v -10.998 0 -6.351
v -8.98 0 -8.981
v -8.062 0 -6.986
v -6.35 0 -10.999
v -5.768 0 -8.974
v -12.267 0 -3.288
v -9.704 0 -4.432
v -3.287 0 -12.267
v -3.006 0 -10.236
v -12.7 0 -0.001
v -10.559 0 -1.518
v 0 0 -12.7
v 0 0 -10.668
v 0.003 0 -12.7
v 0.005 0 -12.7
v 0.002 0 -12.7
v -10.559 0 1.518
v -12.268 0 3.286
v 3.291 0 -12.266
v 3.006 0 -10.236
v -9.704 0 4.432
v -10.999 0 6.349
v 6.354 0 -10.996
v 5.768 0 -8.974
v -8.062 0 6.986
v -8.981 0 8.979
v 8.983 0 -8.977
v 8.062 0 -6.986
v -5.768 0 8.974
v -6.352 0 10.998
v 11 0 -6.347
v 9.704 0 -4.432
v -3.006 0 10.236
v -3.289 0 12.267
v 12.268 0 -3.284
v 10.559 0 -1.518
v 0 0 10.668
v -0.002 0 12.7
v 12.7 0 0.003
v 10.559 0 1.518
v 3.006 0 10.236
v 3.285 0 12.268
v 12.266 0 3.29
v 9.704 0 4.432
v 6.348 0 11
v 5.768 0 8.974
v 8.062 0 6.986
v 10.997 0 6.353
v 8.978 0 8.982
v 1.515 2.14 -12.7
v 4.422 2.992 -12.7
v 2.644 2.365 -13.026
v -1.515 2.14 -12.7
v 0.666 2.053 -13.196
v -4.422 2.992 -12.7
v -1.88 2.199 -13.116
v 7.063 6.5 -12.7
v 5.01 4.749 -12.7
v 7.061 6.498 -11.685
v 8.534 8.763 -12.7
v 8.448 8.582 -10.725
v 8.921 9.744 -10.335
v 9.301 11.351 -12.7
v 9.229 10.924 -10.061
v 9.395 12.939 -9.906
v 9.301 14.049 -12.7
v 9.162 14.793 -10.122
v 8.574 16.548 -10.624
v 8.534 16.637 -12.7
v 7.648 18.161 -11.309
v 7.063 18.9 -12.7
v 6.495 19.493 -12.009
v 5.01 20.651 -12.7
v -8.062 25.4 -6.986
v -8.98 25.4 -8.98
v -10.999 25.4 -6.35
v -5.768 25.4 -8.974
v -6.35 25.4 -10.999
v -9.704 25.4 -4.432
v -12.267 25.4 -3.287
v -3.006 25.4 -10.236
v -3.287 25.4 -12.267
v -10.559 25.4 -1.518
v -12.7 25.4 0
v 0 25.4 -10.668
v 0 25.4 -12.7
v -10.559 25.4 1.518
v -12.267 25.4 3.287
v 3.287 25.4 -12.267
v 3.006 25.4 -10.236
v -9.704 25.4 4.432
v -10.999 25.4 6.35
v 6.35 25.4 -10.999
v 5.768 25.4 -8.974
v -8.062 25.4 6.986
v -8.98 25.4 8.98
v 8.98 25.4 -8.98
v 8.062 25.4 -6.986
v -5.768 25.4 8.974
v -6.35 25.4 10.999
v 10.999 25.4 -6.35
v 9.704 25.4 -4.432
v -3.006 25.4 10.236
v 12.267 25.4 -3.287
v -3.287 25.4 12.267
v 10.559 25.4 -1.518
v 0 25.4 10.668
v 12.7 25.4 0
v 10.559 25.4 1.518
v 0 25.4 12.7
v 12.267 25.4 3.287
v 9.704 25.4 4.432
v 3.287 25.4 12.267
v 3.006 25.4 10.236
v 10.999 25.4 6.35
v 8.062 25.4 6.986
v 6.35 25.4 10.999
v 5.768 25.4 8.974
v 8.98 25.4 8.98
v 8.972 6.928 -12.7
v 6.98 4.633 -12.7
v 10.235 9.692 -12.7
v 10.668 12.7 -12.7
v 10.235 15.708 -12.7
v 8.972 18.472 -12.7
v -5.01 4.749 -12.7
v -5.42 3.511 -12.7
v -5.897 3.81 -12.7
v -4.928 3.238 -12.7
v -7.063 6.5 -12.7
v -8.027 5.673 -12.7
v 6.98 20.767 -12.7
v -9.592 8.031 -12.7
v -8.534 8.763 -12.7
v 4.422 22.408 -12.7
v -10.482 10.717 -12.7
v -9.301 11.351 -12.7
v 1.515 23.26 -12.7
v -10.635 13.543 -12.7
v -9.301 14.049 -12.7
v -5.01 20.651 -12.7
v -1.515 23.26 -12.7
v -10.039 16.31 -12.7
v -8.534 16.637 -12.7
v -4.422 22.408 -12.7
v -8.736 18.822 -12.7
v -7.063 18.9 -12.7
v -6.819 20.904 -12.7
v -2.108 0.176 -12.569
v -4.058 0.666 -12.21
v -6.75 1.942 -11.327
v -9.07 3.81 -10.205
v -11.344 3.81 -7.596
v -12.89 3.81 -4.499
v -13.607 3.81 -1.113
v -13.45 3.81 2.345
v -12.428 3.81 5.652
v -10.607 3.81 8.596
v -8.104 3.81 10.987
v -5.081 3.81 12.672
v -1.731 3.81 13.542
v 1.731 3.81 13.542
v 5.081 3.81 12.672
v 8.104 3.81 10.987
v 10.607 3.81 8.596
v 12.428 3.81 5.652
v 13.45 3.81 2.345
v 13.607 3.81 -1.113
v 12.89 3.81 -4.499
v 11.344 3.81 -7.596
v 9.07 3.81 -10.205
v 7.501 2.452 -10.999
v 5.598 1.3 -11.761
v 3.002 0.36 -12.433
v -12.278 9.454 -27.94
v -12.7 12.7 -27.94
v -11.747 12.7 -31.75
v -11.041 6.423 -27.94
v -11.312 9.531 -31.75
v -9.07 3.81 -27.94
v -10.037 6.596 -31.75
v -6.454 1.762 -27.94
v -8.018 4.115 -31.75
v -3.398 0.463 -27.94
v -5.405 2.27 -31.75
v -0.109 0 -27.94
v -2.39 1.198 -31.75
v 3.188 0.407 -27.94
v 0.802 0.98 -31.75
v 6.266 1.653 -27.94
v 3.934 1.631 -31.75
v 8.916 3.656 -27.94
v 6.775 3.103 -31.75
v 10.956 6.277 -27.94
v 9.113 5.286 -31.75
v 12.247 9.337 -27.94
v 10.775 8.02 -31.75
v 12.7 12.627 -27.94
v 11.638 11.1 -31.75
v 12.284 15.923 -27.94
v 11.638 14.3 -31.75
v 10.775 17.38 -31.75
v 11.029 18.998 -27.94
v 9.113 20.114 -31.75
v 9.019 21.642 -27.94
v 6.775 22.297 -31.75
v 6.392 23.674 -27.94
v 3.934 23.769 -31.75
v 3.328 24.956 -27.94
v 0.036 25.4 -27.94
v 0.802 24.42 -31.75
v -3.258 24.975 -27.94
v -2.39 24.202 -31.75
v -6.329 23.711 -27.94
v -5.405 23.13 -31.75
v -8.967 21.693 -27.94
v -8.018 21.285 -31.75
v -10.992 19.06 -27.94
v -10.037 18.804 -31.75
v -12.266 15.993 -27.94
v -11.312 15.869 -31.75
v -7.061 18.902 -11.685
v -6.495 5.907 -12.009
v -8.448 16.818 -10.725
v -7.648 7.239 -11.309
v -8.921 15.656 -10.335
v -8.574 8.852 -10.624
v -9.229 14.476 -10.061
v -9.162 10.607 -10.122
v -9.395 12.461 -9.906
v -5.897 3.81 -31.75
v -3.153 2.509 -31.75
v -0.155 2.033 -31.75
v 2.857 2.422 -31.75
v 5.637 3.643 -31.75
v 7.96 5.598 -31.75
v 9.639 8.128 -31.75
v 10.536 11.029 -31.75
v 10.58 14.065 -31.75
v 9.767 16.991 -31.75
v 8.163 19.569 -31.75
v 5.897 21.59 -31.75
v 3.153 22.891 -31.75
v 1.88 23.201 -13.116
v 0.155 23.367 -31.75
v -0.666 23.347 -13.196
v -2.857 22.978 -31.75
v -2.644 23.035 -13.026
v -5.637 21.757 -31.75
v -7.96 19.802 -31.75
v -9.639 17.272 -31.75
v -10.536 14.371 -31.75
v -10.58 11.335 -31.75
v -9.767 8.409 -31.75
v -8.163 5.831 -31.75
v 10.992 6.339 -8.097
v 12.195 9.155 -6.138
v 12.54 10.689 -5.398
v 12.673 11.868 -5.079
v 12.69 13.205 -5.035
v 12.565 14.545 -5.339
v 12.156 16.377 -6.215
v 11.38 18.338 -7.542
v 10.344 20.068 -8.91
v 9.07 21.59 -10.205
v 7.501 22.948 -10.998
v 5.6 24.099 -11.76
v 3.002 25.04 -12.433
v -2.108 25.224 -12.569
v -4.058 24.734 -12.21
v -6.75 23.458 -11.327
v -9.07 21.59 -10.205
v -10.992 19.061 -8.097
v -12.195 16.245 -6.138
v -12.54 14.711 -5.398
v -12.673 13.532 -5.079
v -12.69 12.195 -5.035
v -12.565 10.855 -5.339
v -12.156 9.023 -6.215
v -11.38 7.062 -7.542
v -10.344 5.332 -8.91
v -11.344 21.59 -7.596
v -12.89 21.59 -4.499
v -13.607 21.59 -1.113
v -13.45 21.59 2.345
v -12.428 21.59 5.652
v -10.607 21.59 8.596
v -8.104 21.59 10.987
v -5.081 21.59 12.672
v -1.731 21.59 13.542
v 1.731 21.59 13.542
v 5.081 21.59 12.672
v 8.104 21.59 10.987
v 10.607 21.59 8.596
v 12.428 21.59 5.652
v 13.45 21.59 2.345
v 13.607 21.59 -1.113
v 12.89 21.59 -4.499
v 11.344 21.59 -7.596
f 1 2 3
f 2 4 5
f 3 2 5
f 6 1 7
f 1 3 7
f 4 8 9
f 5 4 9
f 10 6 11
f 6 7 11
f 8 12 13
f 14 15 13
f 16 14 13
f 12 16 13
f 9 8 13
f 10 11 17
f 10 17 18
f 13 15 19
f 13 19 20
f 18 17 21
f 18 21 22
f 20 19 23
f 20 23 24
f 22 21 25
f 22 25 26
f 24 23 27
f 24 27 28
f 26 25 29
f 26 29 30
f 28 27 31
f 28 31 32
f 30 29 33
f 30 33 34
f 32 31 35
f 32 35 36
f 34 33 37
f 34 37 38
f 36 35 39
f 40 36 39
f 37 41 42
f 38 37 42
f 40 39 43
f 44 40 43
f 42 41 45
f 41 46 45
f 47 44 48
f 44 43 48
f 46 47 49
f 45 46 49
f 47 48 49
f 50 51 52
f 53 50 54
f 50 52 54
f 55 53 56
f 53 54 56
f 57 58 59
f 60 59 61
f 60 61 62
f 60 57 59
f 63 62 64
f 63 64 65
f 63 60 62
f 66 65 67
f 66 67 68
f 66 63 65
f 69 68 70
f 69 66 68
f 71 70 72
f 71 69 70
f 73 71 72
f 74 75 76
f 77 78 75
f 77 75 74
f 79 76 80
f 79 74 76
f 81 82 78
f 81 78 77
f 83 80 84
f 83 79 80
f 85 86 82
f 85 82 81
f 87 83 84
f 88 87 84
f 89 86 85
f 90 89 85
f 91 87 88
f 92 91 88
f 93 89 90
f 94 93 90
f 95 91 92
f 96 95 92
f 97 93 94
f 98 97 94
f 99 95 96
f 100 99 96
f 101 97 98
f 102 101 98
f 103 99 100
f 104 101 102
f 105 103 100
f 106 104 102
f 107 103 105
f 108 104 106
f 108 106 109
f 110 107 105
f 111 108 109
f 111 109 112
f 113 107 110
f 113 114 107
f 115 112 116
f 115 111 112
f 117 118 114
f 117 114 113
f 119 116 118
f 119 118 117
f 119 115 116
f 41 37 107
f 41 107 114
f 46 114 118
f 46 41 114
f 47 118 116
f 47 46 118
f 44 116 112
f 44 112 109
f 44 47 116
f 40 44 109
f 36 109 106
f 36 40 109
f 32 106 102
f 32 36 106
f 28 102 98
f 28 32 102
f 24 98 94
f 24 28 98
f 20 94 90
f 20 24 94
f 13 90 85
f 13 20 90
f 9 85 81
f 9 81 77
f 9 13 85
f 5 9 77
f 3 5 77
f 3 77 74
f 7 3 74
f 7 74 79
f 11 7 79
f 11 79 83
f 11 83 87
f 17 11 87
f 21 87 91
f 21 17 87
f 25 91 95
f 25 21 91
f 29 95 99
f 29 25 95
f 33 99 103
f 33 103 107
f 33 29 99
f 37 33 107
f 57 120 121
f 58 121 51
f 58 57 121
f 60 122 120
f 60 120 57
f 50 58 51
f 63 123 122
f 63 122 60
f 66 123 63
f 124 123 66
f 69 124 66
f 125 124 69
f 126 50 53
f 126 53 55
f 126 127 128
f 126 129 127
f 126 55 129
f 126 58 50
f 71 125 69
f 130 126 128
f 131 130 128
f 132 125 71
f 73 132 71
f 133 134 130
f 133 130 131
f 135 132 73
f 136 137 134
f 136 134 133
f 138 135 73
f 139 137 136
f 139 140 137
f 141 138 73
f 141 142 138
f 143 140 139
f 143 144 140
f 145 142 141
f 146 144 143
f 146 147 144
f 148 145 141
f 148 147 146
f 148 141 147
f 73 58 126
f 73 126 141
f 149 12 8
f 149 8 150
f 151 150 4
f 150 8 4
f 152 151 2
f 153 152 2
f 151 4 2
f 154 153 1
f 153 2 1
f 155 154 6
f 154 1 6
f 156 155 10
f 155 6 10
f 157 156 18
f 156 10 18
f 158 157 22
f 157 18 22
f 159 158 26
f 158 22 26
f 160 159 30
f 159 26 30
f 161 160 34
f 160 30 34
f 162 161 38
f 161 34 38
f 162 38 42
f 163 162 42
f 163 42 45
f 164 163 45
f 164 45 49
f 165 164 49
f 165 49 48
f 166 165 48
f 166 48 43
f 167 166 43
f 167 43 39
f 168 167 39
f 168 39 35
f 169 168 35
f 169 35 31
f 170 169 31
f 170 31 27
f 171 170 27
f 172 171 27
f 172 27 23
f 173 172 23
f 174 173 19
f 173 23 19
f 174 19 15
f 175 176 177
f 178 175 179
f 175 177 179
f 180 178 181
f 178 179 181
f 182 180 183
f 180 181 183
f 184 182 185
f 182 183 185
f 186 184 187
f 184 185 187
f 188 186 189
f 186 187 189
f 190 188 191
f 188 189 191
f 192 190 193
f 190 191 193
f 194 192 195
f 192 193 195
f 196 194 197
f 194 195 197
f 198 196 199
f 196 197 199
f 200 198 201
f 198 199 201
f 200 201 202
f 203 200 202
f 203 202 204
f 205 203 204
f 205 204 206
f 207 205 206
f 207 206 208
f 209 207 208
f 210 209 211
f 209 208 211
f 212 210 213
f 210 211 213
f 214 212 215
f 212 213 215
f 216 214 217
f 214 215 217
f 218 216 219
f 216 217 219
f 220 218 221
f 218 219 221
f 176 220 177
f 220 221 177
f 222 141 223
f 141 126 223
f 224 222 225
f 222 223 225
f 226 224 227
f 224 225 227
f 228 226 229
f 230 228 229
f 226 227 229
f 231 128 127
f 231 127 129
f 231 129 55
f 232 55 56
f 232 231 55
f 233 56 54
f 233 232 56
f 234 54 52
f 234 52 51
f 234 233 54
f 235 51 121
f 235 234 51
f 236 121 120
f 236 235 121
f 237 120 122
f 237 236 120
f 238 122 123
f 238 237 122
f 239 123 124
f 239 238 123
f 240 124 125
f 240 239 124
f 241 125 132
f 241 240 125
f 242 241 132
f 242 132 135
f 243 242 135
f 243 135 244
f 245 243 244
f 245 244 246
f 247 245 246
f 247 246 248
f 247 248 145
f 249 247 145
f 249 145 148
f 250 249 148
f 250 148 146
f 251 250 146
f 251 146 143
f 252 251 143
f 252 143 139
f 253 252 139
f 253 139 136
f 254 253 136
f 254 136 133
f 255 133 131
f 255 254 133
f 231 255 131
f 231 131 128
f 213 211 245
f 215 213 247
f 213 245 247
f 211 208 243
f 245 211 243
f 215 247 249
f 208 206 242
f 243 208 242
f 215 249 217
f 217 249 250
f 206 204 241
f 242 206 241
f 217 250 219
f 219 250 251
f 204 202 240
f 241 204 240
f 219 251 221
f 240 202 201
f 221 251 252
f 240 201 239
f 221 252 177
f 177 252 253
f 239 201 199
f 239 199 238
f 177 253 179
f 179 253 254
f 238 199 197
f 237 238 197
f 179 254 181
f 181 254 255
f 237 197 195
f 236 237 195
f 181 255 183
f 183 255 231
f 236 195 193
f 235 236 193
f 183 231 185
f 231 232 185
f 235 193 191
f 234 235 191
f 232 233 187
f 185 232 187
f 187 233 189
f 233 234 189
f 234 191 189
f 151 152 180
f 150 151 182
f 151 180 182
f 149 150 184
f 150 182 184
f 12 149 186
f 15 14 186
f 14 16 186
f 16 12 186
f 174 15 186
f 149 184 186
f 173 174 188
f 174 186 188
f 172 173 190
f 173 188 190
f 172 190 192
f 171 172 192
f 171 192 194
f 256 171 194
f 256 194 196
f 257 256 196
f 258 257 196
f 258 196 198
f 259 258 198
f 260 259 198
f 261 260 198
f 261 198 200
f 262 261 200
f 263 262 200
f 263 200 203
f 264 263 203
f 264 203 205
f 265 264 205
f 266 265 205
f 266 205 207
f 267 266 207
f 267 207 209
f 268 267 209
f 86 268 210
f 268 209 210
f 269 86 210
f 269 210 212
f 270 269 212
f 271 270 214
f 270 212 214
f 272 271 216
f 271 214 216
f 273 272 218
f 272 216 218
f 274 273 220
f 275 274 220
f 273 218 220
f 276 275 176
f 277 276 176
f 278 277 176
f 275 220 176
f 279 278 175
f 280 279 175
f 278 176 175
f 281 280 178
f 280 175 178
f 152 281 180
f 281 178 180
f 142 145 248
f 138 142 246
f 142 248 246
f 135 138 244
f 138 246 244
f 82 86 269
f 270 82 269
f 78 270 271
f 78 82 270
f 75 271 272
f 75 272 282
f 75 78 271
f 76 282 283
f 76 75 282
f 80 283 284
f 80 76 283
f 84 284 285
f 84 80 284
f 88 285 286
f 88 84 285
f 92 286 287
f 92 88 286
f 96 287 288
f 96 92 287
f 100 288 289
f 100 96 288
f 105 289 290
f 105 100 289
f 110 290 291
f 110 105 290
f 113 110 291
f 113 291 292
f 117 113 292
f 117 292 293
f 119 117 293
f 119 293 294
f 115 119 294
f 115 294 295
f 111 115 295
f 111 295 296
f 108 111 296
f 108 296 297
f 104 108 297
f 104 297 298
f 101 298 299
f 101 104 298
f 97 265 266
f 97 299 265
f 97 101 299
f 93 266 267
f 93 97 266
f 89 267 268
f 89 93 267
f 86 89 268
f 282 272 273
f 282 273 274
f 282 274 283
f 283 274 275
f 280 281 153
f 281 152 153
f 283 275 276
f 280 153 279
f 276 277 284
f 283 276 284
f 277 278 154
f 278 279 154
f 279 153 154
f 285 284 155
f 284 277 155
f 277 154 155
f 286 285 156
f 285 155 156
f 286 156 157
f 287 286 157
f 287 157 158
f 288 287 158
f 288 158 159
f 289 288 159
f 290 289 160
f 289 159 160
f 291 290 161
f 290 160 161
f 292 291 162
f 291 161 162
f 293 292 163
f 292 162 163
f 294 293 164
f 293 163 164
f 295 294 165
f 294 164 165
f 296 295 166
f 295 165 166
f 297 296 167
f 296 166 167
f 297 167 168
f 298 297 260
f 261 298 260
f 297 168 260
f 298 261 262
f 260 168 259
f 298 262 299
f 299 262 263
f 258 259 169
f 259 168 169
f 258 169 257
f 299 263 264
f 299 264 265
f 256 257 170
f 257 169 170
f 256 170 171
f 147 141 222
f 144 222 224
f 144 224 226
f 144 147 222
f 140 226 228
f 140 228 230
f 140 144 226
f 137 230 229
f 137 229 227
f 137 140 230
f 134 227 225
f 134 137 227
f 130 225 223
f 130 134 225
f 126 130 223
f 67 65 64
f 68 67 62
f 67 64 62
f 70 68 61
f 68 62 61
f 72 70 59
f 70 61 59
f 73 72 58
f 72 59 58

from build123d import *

# Parameters (mm, degrees)
SKETCH1_R           = 13.6525
SKETCH1_R_2         = 10.668
BOSS_EXTRUDE1_DEPTH = 25.4
BOSS_EXTRUDE2_REACH = 55.786
SKETCH4_R           = 12.7
SKETCH4_R_2         = 10.668
SKETCH12_R          = 10.668
CUT_EXTRUDE1_DEPTH  = 19.05
BOSS_EXTRUDE4_REACH = 41.064


with BuildPart() as part:
    # Sketch1 → Boss-Extrude1 (new body)
    with BuildSketch(Plane(origin=(0, 0, 0), x_dir=(1, 0, 0), z_dir=(0, 1, 0))):
        with Locations(Location((0, 0, 0), (0, 0, 270))):
            Circle(SKETCH1_R)
        with Locations(Location((0, 0, 0), (0, 0, 270))):
            Circle(SKETCH1_R_2, mode=Mode.SUBTRACT)
    extrude(amount=BOSS_EXTRUDE1_DEPTH)

    # Sketch10 → Cut-Revolve4 (revolve, cut)
    with BuildSketch(Plane(origin=(0, 0, 0), x_dir=(0, 0, -1), z_dir=(1, 0, 0)), mode=Mode.PRIVATE) as cut_revolve4_sk:
        Polygon((-13.6525, 0), (-13.6525, 3.81), (-12.7, 0), align=None)
    cut_revolve4 = revolve(cut_revolve4_sk.sketch.rotate(Axis((0, 0, 0), (0, 1, 0)), 180), axis=Axis((0, 0, 0), (0, 1, 0)), mode=Mode.SUBTRACT)

    # Mirror1: Cut-Revolve4 across plane
    add(cut_revolve4.mirror(Plane.ZX.offset(12.7)), mode=Mode.SUBTRACT)

    # Sketch4 → Boss-Extrude2 (add, up to next)
    with BuildSketch(Plane.XY.offset(-31.75), mode=Mode.PRIVATE) as boss_extrude2_sk1:
        with Locations(Location((0, 12.7, 0), (0, 0, 224.427003928))):
            Circle(SKETCH4_R)
        with Locations(Location((0, 12.7, 0), (0, 0, 236.442690207))):
            Circle(SKETCH4_R_2, mode=Mode.SUBTRACT)
    boss_extrude2_tool1 = extrude(boss_extrude2_sk1.sketch, amount=BOSS_EXTRUDE2_REACH, mode=Mode.PRIVATE) - part.part
    add(boss_extrude2_tool1.solids().sort_by_distance((8.813087, 21.338553, -31.75))[0])

    # Sketch11 → Cut-Revolve5 (revolve, cut)
    with BuildSketch(Plane(origin=(0, 0, 0), x_dir=(0, 0, -1), z_dir=(1, 0, 0)), mode=Mode.PRIVATE) as cut_revolve5_sk:
        Polygon((31.75, 0), (27.94, 0), (31.75, 0.9525), align=None)
    revolve(cut_revolve5_sk.sketch.rotate(Axis((0, 12.7, -31.75), (0, 0, 1)), 270), axis=Axis((0, 12.7, -31.75), (0, 0, 1)), mode=Mode.SUBTRACT)

    # Sketch12 → Cut-Extrude1 (cut)
    with BuildSketch(Plane(origin=(0, 0, -31.75), x_dir=(-1, 0, 0), z_dir=(0, 0, -1))):
        with Locations(Location((0, 12.7, 0), (0, 0, 303.557309793))):
            Circle(SKETCH12_R)
    extrude(amount=-CUT_EXTRUDE1_DEPTH, mode=Mode.SUBTRACT)

    # Sketch13 → Boss-Extrude4 (add, up to next)
    with BuildSketch(Plane(origin=(0, 0, -12.7), x_dir=(-1, 0, 0), z_dir=(0, 0, -1)), mode=Mode.PRIVATE) as boss_extrude4_sk1:
        with BuildLine():
            ThreePointArc((4.42238726, 2.991822265), (10.668, 12.700000001), (4.422387259, 22.408177735))
            add(Edge.make_bspline(
                [(4.422387248, 22.408177726), (4.714008579, 22.02457668), (5.010065494, 21.59)],
                knots=[0.341540519, 0.341540519, 0.341540519, 0.384917679, 0.384917679, 0.384917679], degree=2, weights=[1, 1.000235206, 1]))
            Line((5.010065494, 21.59), (5.010065494, 20.65120417))
            ThreePointArc((5.010065494, 20.65120417), (9.398, 12.7), (5.010065494, 4.74879583))
            Line((5.010065494, 4.74879583), (5.010065494, 3.81))
            add(Edge.make_bspline(
                [(5.010065496, 3.810000003), (4.714008581, 3.375423322), (4.422387248, 2.991822274)],
                knots=[-0.384917679, -0.384917679, -0.384917679, -0.341540519, -0.341540519, -0.341540519], degree=2, weights=[1, 1.000235206, 1]))
        make_face()
    boss_extrude4_tool1 = extrude(boss_extrude4_sk1.sketch, amount=-BOSS_EXTRUDE4_REACH, mode=Mode.PRIVATE) - part.part
    # Sketch13 → Boss-Extrude4 (add, up to next)
    with BuildSketch(Plane(origin=(0, 0, -12.7), x_dir=(-1, 0, 0), z_dir=(0, 0, -1)), mode=Mode.PRIVATE) as boss_extrude4_sk2:
        with BuildLine():
            add(Edge.make_bspline(
                [(-5.010065494, 21.59), (-4.714008579, 22.02457668), (-4.422387248, 22.408177726)],
                knots=[-0.384917679, -0.384917679, -0.384917679, -0.341540519, -0.341540519, -0.341540519], degree=2, weights=[1, 1.000235206, 1]))
            ThreePointArc((-4.422387259, 22.408177735), (-10.668, 12.7), (-4.422387258, 2.991822265))
            add(Edge.make_bspline(
                [(-4.422387248, 2.991822273), (-4.71400858, 3.375423321), (-5.010065496, 3.810000003)],
                knots=[0.341540519, 0.341540519, 0.341540519, 0.384917679, 0.384917679, 0.384917679], degree=2, weights=[1, 1.000235206, 1]))
            Line((-5.010065494, 3.81), (-5.010065494, 4.74879583))
            ThreePointArc((-5.010065494, 4.74879583), (-9.398, 12.7), (-5.010065494, 20.65120417))
            Line((-5.010065494, 20.65120417), (-5.010065494, 21.59))
        make_face()
    boss_extrude4_tool2 = extrude(boss_extrude4_sk2.sketch, amount=-BOSS_EXTRUDE4_REACH, mode=Mode.PRIVATE) - part.part
    add(boss_extrude4_tool1.solids().sort_by_distance((-10.464039, 12.7, -12.7))[0])
    add(boss_extrude4_tool2.solids().sort_by_distance((5.214027, 21.120602, -12.7))[0])


solid = part.part
